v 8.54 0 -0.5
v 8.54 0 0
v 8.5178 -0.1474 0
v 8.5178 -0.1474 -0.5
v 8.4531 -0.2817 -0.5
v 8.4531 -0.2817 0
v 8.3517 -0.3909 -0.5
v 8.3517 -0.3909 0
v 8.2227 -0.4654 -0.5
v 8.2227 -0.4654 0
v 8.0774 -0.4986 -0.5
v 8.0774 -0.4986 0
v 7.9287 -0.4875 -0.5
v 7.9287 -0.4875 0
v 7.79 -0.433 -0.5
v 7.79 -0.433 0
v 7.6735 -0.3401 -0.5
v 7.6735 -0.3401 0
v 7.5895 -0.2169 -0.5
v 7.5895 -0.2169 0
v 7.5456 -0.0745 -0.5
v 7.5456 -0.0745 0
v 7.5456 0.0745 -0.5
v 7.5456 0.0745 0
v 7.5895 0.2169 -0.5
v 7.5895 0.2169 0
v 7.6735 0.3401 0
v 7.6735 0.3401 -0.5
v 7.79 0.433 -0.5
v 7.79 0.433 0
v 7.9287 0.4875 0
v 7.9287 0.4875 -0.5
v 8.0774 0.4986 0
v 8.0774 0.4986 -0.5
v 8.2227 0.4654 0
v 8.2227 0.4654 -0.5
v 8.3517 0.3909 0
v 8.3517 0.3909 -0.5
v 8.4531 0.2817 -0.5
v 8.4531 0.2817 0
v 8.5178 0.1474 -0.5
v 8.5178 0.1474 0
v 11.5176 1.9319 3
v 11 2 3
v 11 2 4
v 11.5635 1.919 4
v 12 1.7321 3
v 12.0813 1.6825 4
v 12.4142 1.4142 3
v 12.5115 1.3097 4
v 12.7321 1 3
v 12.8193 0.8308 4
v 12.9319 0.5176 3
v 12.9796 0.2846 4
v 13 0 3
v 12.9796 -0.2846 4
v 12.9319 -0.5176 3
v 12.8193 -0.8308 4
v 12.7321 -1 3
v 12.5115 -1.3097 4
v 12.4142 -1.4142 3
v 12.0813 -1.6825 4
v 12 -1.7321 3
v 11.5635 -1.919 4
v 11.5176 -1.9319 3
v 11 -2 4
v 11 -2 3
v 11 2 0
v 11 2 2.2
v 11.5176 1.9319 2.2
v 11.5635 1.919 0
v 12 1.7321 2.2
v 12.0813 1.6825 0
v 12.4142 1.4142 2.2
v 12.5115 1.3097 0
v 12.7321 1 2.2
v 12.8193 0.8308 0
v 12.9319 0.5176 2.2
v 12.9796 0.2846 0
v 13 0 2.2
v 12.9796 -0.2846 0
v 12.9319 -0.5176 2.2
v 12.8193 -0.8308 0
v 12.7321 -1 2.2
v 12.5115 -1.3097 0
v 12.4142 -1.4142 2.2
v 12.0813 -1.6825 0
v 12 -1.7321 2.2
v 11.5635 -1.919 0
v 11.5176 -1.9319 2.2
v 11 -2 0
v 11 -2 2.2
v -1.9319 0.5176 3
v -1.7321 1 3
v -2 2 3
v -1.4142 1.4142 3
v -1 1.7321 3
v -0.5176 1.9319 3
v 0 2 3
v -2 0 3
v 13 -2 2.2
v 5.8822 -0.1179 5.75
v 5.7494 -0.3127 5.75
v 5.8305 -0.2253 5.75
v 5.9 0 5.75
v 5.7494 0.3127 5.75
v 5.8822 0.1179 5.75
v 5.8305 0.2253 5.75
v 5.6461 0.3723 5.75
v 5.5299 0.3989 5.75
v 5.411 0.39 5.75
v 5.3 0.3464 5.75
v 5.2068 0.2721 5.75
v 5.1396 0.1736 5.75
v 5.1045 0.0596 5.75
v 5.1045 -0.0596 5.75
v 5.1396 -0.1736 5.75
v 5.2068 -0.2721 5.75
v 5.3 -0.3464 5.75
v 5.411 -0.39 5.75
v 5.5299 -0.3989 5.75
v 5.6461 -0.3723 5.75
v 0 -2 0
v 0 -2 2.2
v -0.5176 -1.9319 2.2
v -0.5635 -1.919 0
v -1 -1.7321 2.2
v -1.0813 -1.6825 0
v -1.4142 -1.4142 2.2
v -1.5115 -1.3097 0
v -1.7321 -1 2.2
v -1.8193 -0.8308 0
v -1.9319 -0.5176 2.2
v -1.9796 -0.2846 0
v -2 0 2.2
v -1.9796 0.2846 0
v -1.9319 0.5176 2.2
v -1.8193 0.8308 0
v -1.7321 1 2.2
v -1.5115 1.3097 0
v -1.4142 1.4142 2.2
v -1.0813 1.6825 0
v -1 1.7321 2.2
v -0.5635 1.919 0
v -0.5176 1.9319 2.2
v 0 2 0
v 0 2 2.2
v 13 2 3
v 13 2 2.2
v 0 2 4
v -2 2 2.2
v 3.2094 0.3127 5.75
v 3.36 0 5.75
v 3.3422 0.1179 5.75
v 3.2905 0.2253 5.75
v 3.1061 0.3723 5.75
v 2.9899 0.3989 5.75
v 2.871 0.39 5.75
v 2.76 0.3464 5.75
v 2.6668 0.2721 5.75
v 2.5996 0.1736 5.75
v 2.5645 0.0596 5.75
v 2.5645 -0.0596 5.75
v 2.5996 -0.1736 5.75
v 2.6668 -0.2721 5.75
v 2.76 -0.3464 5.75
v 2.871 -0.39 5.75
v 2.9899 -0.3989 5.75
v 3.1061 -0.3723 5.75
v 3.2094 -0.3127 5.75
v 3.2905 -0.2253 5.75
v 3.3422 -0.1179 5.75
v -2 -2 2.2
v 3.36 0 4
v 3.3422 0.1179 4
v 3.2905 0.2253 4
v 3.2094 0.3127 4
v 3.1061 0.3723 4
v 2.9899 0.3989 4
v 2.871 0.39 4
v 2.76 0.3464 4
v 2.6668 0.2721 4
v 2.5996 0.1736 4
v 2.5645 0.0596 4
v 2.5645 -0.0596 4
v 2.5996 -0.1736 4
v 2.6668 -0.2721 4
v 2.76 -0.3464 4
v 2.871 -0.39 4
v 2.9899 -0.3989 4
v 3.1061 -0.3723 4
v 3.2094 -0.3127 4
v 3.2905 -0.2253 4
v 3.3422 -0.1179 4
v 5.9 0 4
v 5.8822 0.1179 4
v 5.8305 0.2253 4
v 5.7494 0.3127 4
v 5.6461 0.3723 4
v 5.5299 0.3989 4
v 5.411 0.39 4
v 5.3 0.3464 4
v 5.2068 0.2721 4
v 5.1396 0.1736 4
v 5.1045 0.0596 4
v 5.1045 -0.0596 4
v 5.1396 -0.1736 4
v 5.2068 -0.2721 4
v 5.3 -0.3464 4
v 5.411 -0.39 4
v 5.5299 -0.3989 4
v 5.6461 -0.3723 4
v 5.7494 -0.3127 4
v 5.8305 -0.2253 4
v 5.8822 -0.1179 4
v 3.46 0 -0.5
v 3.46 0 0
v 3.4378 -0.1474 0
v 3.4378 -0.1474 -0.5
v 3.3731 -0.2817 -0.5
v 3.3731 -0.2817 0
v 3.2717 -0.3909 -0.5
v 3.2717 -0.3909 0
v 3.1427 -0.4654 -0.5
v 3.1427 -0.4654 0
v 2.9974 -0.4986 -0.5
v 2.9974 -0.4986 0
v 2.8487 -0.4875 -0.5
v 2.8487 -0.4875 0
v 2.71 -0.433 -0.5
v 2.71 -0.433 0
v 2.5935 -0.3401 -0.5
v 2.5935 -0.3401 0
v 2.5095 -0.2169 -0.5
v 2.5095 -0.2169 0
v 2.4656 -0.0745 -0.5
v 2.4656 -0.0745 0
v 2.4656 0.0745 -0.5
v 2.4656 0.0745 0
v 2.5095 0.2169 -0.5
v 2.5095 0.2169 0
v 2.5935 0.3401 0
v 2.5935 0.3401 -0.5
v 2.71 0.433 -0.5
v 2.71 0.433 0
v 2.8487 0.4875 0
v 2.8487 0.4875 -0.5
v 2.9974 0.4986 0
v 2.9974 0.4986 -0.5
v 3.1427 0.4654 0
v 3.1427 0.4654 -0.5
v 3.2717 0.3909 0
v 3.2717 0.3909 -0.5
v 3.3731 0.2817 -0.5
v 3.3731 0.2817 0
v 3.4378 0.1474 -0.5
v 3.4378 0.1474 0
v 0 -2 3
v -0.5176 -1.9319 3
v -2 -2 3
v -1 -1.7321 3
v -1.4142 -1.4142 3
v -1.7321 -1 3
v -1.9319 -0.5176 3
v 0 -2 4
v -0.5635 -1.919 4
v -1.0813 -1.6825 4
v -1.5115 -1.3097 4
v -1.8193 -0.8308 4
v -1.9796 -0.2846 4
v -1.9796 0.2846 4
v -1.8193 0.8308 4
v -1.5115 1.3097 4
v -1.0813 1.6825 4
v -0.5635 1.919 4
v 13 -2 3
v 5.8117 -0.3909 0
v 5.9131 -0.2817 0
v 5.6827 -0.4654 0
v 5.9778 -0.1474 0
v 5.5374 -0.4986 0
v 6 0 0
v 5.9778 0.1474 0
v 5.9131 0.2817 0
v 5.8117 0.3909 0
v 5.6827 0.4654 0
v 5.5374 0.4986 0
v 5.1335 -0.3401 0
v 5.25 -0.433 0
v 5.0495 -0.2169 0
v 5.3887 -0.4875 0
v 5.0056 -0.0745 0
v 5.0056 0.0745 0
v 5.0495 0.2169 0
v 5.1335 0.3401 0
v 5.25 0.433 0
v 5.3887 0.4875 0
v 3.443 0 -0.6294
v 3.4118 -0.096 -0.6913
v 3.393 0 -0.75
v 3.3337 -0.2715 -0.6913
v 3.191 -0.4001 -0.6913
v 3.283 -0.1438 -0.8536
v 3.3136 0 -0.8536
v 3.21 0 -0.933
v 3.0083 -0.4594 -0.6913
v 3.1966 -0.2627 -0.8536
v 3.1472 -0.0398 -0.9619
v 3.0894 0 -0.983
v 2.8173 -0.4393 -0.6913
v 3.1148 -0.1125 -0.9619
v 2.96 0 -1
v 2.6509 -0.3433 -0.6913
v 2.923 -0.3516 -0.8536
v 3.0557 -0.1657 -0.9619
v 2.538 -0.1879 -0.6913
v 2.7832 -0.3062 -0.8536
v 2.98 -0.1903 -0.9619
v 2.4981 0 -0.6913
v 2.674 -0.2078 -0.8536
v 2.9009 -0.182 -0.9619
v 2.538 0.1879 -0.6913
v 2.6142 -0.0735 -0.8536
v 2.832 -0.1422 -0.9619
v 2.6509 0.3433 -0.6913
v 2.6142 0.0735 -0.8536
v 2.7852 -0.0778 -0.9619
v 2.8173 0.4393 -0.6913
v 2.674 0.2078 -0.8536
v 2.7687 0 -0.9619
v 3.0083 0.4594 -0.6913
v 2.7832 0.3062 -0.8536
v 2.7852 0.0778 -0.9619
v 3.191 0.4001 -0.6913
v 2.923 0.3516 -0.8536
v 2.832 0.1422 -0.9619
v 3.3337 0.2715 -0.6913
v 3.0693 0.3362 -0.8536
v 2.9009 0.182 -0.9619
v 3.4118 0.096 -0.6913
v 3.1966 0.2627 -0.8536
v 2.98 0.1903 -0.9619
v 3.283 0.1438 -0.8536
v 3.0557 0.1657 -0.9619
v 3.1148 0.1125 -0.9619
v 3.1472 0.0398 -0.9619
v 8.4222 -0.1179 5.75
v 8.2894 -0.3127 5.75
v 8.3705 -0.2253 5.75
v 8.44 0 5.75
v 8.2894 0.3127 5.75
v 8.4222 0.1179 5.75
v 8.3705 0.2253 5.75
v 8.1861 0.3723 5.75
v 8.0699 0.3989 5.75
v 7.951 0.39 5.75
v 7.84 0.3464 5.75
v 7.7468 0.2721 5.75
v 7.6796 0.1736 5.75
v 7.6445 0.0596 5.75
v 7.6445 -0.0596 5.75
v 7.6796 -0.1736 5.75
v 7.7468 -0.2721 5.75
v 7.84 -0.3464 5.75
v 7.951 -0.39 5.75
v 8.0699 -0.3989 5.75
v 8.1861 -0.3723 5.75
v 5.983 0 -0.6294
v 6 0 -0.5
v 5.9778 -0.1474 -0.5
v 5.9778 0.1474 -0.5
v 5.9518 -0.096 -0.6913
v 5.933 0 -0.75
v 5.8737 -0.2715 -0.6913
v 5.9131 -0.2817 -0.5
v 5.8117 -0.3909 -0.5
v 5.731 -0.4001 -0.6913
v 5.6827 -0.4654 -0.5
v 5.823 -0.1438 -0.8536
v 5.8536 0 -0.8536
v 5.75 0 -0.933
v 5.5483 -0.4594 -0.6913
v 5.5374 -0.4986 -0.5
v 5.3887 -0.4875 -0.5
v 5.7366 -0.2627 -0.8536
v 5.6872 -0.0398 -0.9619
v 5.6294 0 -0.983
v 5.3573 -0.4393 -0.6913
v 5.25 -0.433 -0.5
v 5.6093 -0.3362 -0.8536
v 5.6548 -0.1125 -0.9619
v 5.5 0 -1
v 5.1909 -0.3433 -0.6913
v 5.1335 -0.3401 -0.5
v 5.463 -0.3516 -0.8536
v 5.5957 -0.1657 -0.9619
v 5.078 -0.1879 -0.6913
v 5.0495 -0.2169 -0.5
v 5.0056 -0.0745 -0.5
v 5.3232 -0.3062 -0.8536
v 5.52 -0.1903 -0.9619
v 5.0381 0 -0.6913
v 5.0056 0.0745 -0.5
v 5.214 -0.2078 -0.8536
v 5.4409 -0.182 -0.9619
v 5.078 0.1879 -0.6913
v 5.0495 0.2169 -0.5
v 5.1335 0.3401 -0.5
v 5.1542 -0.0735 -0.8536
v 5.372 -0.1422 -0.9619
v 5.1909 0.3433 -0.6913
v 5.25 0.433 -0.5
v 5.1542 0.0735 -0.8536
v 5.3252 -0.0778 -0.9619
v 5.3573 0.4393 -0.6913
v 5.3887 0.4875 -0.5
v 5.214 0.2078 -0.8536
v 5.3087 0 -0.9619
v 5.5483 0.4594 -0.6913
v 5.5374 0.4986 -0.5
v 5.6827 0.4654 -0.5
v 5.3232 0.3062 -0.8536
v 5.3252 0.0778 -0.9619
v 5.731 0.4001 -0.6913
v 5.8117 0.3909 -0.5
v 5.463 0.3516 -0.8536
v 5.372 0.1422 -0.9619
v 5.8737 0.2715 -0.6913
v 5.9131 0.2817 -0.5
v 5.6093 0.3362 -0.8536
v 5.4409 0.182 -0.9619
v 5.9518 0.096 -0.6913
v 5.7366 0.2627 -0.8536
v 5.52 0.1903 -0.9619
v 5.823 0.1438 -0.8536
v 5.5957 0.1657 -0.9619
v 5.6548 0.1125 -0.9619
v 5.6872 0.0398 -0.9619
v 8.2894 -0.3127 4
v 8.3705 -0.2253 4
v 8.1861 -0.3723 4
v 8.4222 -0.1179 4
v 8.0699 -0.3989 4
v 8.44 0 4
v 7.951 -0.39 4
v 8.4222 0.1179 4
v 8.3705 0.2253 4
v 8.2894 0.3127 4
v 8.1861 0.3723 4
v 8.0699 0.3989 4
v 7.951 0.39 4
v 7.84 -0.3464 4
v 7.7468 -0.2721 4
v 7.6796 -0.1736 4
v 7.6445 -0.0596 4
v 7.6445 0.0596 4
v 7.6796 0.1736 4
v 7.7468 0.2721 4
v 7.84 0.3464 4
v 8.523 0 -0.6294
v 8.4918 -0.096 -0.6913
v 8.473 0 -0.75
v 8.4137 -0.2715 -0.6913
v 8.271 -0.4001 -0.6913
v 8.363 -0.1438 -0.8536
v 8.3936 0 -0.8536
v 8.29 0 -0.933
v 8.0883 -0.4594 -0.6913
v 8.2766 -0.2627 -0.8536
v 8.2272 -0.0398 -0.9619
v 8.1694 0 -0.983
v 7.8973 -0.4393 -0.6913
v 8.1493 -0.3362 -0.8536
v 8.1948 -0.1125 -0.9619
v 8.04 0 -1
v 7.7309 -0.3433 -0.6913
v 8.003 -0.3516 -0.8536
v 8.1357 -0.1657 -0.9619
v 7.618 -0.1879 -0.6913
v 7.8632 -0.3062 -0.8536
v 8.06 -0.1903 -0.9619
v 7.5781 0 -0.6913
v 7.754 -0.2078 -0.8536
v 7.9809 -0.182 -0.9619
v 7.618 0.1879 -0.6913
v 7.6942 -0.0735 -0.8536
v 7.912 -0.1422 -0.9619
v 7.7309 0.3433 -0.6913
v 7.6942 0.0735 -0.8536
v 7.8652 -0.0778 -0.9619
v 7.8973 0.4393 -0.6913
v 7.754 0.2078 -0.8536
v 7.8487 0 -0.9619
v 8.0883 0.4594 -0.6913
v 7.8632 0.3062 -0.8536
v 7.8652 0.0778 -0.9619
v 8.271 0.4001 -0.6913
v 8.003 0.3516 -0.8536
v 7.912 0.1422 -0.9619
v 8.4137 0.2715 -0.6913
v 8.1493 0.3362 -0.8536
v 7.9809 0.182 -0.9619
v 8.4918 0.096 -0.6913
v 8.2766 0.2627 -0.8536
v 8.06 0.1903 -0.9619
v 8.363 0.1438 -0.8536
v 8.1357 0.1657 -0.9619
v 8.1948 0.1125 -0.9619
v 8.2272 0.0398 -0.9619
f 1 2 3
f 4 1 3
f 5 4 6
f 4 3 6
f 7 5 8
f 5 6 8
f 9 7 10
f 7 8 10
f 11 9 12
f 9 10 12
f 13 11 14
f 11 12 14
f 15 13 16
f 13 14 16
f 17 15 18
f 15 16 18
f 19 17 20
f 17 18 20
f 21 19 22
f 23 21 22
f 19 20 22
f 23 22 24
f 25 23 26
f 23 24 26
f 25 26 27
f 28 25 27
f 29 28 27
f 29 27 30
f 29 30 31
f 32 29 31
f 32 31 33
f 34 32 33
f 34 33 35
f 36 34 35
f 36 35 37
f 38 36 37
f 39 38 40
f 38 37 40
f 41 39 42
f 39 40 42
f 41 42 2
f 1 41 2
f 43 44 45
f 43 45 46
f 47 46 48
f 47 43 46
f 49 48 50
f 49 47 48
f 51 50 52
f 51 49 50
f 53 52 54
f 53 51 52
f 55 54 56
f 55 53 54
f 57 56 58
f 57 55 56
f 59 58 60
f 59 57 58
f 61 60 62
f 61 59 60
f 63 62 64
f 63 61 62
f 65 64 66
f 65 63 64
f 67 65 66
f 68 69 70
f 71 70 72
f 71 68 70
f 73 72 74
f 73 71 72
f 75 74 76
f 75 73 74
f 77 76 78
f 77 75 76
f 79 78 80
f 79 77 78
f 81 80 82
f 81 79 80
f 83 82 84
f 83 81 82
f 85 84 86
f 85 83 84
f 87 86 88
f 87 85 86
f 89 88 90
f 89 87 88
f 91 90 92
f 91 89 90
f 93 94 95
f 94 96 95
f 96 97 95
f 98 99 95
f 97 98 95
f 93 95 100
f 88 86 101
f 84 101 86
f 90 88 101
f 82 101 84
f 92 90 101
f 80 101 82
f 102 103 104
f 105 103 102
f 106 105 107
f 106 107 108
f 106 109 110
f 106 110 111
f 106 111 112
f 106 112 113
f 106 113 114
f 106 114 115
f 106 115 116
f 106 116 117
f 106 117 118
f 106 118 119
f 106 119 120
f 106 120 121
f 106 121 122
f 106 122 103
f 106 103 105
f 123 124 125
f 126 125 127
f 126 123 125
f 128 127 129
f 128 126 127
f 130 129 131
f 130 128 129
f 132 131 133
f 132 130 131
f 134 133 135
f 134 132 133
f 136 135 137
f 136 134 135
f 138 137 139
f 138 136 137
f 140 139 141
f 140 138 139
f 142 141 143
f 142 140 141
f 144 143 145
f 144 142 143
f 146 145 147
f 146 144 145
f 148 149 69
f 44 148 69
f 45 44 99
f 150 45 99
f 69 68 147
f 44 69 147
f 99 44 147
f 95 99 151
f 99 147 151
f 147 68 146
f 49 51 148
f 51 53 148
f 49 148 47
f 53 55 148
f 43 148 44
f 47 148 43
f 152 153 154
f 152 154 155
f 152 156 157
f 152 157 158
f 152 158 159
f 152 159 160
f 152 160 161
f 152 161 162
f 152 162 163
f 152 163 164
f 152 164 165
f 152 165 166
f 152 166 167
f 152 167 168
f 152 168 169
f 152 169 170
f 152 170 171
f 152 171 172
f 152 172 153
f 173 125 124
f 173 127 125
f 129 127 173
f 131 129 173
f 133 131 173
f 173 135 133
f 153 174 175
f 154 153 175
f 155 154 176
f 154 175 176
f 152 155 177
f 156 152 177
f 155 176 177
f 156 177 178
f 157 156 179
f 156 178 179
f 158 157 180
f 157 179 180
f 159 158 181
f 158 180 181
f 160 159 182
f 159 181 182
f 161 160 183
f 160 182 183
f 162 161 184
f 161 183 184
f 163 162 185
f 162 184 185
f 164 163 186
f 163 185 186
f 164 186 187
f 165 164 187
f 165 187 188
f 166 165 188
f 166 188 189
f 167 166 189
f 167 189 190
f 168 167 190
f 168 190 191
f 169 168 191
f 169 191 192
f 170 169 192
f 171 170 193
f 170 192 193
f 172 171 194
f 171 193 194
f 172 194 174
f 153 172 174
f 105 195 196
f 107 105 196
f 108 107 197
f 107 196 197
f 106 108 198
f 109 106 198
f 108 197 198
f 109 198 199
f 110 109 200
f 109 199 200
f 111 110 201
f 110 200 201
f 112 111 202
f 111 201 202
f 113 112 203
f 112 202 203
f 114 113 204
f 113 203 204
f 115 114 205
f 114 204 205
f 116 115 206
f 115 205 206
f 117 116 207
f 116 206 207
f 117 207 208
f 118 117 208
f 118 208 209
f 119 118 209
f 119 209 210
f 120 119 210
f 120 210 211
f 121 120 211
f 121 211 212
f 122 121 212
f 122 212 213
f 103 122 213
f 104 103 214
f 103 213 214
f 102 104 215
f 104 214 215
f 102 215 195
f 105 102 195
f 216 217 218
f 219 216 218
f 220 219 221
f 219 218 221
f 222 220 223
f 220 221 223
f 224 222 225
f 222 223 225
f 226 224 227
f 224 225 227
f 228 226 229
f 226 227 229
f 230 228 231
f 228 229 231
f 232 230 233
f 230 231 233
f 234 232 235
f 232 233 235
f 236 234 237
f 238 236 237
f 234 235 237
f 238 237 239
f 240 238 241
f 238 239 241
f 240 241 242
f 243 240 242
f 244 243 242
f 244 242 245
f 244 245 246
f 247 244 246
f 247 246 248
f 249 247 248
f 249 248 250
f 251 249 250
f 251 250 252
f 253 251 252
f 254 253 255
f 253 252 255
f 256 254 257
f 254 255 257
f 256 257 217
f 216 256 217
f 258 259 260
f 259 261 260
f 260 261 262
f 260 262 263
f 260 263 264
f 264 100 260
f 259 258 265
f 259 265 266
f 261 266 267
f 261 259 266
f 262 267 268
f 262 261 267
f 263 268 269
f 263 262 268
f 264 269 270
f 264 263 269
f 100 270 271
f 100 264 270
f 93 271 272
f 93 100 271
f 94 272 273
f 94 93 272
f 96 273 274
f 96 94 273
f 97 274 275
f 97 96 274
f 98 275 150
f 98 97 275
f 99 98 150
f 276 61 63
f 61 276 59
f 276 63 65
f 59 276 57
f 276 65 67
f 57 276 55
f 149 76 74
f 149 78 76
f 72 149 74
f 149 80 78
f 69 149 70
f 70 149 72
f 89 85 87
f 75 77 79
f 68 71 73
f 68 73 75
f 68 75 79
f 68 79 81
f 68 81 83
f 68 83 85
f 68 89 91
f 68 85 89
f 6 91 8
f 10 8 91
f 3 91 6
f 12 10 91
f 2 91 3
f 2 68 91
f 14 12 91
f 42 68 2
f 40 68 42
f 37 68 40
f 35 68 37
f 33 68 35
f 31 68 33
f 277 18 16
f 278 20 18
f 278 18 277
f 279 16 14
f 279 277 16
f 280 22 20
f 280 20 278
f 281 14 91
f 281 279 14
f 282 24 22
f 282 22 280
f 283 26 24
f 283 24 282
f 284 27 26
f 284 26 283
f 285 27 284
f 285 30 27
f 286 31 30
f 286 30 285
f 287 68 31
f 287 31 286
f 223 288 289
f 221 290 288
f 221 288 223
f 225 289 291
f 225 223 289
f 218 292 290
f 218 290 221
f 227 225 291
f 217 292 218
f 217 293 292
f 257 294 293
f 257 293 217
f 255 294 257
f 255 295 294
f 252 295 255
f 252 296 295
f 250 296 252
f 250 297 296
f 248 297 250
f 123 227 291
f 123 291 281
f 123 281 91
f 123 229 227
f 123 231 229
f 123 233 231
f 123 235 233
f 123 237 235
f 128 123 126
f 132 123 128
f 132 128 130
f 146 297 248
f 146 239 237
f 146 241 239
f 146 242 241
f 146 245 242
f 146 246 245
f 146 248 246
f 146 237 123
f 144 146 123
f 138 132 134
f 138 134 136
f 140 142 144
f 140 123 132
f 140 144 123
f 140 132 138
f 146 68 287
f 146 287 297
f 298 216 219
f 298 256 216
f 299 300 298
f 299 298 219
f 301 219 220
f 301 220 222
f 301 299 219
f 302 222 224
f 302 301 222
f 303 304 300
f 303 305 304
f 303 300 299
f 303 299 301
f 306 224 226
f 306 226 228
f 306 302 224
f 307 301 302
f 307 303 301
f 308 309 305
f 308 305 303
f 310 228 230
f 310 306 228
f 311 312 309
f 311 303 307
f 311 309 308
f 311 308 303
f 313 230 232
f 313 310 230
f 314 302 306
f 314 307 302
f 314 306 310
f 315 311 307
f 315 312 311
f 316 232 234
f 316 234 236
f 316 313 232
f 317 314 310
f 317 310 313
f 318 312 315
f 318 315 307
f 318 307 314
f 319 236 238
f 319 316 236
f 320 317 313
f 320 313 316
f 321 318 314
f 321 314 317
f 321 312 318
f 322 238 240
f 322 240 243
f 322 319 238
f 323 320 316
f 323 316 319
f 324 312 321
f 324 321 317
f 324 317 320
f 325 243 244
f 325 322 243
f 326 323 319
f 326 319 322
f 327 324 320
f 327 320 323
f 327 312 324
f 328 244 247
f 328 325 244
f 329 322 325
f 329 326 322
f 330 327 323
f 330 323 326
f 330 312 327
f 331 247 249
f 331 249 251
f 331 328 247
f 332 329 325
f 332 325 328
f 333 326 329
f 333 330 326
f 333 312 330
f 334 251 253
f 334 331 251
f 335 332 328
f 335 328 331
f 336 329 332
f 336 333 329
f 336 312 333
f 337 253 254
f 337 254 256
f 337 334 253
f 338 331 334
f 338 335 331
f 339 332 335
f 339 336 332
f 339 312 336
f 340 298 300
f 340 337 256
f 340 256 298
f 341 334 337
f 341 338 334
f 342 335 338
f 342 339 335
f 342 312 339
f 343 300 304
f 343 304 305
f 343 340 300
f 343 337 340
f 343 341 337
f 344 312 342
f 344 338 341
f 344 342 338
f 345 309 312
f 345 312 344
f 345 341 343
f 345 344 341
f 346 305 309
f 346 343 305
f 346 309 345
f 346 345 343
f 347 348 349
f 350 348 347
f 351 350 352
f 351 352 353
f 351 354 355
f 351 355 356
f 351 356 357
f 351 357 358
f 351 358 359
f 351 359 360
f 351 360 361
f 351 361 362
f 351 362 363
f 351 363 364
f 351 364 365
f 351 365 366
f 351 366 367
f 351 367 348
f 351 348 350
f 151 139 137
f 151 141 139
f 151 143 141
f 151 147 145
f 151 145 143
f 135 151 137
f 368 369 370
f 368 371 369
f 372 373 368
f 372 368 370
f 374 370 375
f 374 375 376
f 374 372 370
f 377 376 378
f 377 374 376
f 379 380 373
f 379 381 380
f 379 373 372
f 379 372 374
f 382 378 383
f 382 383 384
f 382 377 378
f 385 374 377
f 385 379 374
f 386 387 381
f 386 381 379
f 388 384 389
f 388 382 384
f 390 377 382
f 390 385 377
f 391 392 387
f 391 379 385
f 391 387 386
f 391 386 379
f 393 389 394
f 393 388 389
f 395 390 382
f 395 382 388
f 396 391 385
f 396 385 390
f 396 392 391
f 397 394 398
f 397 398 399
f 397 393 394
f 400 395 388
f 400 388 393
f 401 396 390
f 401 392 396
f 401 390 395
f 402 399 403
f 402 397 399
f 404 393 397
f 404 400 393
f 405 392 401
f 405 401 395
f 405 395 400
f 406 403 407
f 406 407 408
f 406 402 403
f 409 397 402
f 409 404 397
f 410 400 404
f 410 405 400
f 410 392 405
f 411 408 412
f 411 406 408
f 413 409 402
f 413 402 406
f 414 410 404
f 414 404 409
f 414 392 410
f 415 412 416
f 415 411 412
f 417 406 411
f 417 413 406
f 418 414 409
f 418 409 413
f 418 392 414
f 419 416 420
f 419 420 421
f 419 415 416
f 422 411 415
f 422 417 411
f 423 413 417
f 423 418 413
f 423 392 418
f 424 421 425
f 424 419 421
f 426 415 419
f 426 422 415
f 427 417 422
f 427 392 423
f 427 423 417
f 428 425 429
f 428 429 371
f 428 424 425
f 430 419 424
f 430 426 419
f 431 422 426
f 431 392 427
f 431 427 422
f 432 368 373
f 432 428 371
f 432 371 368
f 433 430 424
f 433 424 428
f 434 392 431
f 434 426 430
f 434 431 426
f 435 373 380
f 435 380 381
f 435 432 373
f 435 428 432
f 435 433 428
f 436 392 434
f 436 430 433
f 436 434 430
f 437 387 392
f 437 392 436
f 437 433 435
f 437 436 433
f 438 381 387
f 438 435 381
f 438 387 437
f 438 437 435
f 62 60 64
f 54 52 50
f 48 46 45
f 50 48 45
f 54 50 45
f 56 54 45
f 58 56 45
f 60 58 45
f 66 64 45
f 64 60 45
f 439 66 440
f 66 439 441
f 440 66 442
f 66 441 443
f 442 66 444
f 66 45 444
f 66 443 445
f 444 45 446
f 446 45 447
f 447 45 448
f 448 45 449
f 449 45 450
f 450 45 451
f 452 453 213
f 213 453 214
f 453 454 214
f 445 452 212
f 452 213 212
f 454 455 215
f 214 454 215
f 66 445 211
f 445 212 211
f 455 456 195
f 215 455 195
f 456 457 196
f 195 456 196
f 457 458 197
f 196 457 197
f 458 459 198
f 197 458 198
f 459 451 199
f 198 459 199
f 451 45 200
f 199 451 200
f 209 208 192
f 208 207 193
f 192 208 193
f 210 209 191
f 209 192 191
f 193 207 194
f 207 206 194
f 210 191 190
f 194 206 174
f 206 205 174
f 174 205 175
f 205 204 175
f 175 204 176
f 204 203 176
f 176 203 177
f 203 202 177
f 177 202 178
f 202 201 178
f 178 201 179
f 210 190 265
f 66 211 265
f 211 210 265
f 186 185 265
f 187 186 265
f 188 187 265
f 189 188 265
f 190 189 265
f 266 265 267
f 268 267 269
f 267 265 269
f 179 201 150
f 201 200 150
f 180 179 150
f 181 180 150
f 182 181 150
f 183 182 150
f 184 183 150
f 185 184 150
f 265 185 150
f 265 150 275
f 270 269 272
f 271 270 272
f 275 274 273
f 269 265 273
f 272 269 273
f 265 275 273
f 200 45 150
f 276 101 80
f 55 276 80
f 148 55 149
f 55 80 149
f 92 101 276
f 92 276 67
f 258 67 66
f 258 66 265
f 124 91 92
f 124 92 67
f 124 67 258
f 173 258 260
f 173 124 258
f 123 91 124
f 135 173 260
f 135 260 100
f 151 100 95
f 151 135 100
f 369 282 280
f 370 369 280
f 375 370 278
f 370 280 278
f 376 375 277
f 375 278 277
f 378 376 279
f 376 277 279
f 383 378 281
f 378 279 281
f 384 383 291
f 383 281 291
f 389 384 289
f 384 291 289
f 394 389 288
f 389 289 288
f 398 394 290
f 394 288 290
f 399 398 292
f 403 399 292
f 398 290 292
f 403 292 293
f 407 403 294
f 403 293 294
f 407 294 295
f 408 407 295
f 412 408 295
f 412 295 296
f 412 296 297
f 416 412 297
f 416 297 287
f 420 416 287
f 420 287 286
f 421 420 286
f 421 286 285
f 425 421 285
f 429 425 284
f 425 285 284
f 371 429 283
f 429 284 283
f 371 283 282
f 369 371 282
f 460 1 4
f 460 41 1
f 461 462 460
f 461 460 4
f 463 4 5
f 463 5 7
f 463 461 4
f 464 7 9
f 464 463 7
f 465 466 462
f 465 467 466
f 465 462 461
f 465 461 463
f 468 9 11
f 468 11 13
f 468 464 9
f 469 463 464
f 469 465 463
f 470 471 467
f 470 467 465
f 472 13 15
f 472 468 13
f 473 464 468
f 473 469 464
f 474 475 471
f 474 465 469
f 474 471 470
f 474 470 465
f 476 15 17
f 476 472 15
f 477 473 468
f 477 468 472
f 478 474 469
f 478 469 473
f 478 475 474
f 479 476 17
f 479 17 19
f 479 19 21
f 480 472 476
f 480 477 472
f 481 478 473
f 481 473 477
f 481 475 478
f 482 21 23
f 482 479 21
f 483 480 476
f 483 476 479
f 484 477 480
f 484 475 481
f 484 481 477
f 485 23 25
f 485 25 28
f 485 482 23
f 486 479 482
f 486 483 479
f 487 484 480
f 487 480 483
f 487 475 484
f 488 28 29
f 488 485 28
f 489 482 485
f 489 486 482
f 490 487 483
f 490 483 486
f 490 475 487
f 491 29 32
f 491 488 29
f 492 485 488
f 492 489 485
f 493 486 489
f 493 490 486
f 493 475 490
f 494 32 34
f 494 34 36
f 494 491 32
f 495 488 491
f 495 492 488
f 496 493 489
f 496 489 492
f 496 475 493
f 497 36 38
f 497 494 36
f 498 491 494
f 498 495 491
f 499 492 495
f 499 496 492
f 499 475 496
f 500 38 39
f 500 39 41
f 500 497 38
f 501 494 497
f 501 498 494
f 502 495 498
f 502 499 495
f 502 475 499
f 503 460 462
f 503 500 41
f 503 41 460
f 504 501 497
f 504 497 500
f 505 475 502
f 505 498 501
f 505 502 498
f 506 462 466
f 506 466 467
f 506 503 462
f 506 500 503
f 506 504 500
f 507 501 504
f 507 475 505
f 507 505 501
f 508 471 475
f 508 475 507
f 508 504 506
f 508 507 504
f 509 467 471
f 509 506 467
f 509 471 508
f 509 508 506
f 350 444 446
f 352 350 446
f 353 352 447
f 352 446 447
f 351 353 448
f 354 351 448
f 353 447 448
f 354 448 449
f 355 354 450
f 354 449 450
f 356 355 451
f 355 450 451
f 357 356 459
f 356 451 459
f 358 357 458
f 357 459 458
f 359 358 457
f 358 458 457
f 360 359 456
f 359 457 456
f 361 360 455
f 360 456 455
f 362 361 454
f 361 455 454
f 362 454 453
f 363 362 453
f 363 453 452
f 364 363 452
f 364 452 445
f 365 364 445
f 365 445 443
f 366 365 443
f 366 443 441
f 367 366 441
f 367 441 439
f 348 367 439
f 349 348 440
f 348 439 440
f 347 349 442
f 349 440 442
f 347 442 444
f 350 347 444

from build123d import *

# Parameters (mm, degrees)
EXTRUDE_1_DEPTH = 4
EXTRUDE_START   = -2.2
SKETCH_2_W      = 15
SKETCH_2_H      = 4
EXTRUDE_2_DEPTH = 0.8
SKETCH_3_R      = 0.5
EXTRUDE_3_DEPTH = 1
FILLET_1_R      = 0.5
SKETCH_4_R      = 0.4
EXTRUDE_4_DEPTH = 1.75


with BuildPart() as part:
    # 草图1 → 凸台-拉伸1 (new body)
    with BuildSketch(Plane.XY):
        with BuildLine():
            Line((0, 2), (11, 2))
            ThreePointArc((11, 2), (13, 0), (11, -2))
            Line((11, -2), (0, -2))
            ThreePointArc((0, -2), (-2, 0), (0, 2))
        make_face()
    extrude(amount=EXTRUDE_1_DEPTH)

    # 草图2 → 凸台-拉伸2 (add)
    with BuildSketch(Plane(origin=(0, 0, 0), x_dir=(-1, 0, 0), z_dir=(0, 0, -1)).offset(EXTRUDE_START)):
        with Locations((-5.5, 0)):
            Rectangle(SKETCH_2_W, SKETCH_2_H)
    extrude(amount=-EXTRUDE_2_DEPTH)

    # 草图3 → 凸台-拉伸3 (add)
    with BuildSketch(Plane(origin=(0, 0, 0), x_dir=(-1, 0, 0), z_dir=(0, 0, -1))):
        with Locations(Location((-8.04, 0, 0), (0, 0, 180))):
            Circle(SKETCH_3_R)
        with Locations(Location((-5.5, 0, 0), (0, 0, 180))):
            Circle(SKETCH_3_R)
        with Locations(Location((-2.96, 0, 0), (0, 0, 180))):
            Circle(SKETCH_3_R)
    extrude(amount=EXTRUDE_3_DEPTH)

    # 圆角1
    fillet_1_edges = [part.edges().sort_by_distance(p)[0] for p in [
        (7.54, 0, -1),
        (5, 0, -1),
        (2.46, 0, -1),
    ]]
    fillet(fillet_1_edges, radius=FILLET_1_R)

    # 草图4 → 凸台-拉伸4 (add)
    with BuildSketch(Plane.XY.offset(4)):
        with Locations((2.96, 0)):
            Circle(SKETCH_4_R)
        with Locations((5.5, 0)):
            Circle(SKETCH_4_R)
        with Locations((8.04, 0)):
            Circle(SKETCH_4_R)
    extrude(amount=EXTRUDE_4_DEPTH)


solid = part.part
